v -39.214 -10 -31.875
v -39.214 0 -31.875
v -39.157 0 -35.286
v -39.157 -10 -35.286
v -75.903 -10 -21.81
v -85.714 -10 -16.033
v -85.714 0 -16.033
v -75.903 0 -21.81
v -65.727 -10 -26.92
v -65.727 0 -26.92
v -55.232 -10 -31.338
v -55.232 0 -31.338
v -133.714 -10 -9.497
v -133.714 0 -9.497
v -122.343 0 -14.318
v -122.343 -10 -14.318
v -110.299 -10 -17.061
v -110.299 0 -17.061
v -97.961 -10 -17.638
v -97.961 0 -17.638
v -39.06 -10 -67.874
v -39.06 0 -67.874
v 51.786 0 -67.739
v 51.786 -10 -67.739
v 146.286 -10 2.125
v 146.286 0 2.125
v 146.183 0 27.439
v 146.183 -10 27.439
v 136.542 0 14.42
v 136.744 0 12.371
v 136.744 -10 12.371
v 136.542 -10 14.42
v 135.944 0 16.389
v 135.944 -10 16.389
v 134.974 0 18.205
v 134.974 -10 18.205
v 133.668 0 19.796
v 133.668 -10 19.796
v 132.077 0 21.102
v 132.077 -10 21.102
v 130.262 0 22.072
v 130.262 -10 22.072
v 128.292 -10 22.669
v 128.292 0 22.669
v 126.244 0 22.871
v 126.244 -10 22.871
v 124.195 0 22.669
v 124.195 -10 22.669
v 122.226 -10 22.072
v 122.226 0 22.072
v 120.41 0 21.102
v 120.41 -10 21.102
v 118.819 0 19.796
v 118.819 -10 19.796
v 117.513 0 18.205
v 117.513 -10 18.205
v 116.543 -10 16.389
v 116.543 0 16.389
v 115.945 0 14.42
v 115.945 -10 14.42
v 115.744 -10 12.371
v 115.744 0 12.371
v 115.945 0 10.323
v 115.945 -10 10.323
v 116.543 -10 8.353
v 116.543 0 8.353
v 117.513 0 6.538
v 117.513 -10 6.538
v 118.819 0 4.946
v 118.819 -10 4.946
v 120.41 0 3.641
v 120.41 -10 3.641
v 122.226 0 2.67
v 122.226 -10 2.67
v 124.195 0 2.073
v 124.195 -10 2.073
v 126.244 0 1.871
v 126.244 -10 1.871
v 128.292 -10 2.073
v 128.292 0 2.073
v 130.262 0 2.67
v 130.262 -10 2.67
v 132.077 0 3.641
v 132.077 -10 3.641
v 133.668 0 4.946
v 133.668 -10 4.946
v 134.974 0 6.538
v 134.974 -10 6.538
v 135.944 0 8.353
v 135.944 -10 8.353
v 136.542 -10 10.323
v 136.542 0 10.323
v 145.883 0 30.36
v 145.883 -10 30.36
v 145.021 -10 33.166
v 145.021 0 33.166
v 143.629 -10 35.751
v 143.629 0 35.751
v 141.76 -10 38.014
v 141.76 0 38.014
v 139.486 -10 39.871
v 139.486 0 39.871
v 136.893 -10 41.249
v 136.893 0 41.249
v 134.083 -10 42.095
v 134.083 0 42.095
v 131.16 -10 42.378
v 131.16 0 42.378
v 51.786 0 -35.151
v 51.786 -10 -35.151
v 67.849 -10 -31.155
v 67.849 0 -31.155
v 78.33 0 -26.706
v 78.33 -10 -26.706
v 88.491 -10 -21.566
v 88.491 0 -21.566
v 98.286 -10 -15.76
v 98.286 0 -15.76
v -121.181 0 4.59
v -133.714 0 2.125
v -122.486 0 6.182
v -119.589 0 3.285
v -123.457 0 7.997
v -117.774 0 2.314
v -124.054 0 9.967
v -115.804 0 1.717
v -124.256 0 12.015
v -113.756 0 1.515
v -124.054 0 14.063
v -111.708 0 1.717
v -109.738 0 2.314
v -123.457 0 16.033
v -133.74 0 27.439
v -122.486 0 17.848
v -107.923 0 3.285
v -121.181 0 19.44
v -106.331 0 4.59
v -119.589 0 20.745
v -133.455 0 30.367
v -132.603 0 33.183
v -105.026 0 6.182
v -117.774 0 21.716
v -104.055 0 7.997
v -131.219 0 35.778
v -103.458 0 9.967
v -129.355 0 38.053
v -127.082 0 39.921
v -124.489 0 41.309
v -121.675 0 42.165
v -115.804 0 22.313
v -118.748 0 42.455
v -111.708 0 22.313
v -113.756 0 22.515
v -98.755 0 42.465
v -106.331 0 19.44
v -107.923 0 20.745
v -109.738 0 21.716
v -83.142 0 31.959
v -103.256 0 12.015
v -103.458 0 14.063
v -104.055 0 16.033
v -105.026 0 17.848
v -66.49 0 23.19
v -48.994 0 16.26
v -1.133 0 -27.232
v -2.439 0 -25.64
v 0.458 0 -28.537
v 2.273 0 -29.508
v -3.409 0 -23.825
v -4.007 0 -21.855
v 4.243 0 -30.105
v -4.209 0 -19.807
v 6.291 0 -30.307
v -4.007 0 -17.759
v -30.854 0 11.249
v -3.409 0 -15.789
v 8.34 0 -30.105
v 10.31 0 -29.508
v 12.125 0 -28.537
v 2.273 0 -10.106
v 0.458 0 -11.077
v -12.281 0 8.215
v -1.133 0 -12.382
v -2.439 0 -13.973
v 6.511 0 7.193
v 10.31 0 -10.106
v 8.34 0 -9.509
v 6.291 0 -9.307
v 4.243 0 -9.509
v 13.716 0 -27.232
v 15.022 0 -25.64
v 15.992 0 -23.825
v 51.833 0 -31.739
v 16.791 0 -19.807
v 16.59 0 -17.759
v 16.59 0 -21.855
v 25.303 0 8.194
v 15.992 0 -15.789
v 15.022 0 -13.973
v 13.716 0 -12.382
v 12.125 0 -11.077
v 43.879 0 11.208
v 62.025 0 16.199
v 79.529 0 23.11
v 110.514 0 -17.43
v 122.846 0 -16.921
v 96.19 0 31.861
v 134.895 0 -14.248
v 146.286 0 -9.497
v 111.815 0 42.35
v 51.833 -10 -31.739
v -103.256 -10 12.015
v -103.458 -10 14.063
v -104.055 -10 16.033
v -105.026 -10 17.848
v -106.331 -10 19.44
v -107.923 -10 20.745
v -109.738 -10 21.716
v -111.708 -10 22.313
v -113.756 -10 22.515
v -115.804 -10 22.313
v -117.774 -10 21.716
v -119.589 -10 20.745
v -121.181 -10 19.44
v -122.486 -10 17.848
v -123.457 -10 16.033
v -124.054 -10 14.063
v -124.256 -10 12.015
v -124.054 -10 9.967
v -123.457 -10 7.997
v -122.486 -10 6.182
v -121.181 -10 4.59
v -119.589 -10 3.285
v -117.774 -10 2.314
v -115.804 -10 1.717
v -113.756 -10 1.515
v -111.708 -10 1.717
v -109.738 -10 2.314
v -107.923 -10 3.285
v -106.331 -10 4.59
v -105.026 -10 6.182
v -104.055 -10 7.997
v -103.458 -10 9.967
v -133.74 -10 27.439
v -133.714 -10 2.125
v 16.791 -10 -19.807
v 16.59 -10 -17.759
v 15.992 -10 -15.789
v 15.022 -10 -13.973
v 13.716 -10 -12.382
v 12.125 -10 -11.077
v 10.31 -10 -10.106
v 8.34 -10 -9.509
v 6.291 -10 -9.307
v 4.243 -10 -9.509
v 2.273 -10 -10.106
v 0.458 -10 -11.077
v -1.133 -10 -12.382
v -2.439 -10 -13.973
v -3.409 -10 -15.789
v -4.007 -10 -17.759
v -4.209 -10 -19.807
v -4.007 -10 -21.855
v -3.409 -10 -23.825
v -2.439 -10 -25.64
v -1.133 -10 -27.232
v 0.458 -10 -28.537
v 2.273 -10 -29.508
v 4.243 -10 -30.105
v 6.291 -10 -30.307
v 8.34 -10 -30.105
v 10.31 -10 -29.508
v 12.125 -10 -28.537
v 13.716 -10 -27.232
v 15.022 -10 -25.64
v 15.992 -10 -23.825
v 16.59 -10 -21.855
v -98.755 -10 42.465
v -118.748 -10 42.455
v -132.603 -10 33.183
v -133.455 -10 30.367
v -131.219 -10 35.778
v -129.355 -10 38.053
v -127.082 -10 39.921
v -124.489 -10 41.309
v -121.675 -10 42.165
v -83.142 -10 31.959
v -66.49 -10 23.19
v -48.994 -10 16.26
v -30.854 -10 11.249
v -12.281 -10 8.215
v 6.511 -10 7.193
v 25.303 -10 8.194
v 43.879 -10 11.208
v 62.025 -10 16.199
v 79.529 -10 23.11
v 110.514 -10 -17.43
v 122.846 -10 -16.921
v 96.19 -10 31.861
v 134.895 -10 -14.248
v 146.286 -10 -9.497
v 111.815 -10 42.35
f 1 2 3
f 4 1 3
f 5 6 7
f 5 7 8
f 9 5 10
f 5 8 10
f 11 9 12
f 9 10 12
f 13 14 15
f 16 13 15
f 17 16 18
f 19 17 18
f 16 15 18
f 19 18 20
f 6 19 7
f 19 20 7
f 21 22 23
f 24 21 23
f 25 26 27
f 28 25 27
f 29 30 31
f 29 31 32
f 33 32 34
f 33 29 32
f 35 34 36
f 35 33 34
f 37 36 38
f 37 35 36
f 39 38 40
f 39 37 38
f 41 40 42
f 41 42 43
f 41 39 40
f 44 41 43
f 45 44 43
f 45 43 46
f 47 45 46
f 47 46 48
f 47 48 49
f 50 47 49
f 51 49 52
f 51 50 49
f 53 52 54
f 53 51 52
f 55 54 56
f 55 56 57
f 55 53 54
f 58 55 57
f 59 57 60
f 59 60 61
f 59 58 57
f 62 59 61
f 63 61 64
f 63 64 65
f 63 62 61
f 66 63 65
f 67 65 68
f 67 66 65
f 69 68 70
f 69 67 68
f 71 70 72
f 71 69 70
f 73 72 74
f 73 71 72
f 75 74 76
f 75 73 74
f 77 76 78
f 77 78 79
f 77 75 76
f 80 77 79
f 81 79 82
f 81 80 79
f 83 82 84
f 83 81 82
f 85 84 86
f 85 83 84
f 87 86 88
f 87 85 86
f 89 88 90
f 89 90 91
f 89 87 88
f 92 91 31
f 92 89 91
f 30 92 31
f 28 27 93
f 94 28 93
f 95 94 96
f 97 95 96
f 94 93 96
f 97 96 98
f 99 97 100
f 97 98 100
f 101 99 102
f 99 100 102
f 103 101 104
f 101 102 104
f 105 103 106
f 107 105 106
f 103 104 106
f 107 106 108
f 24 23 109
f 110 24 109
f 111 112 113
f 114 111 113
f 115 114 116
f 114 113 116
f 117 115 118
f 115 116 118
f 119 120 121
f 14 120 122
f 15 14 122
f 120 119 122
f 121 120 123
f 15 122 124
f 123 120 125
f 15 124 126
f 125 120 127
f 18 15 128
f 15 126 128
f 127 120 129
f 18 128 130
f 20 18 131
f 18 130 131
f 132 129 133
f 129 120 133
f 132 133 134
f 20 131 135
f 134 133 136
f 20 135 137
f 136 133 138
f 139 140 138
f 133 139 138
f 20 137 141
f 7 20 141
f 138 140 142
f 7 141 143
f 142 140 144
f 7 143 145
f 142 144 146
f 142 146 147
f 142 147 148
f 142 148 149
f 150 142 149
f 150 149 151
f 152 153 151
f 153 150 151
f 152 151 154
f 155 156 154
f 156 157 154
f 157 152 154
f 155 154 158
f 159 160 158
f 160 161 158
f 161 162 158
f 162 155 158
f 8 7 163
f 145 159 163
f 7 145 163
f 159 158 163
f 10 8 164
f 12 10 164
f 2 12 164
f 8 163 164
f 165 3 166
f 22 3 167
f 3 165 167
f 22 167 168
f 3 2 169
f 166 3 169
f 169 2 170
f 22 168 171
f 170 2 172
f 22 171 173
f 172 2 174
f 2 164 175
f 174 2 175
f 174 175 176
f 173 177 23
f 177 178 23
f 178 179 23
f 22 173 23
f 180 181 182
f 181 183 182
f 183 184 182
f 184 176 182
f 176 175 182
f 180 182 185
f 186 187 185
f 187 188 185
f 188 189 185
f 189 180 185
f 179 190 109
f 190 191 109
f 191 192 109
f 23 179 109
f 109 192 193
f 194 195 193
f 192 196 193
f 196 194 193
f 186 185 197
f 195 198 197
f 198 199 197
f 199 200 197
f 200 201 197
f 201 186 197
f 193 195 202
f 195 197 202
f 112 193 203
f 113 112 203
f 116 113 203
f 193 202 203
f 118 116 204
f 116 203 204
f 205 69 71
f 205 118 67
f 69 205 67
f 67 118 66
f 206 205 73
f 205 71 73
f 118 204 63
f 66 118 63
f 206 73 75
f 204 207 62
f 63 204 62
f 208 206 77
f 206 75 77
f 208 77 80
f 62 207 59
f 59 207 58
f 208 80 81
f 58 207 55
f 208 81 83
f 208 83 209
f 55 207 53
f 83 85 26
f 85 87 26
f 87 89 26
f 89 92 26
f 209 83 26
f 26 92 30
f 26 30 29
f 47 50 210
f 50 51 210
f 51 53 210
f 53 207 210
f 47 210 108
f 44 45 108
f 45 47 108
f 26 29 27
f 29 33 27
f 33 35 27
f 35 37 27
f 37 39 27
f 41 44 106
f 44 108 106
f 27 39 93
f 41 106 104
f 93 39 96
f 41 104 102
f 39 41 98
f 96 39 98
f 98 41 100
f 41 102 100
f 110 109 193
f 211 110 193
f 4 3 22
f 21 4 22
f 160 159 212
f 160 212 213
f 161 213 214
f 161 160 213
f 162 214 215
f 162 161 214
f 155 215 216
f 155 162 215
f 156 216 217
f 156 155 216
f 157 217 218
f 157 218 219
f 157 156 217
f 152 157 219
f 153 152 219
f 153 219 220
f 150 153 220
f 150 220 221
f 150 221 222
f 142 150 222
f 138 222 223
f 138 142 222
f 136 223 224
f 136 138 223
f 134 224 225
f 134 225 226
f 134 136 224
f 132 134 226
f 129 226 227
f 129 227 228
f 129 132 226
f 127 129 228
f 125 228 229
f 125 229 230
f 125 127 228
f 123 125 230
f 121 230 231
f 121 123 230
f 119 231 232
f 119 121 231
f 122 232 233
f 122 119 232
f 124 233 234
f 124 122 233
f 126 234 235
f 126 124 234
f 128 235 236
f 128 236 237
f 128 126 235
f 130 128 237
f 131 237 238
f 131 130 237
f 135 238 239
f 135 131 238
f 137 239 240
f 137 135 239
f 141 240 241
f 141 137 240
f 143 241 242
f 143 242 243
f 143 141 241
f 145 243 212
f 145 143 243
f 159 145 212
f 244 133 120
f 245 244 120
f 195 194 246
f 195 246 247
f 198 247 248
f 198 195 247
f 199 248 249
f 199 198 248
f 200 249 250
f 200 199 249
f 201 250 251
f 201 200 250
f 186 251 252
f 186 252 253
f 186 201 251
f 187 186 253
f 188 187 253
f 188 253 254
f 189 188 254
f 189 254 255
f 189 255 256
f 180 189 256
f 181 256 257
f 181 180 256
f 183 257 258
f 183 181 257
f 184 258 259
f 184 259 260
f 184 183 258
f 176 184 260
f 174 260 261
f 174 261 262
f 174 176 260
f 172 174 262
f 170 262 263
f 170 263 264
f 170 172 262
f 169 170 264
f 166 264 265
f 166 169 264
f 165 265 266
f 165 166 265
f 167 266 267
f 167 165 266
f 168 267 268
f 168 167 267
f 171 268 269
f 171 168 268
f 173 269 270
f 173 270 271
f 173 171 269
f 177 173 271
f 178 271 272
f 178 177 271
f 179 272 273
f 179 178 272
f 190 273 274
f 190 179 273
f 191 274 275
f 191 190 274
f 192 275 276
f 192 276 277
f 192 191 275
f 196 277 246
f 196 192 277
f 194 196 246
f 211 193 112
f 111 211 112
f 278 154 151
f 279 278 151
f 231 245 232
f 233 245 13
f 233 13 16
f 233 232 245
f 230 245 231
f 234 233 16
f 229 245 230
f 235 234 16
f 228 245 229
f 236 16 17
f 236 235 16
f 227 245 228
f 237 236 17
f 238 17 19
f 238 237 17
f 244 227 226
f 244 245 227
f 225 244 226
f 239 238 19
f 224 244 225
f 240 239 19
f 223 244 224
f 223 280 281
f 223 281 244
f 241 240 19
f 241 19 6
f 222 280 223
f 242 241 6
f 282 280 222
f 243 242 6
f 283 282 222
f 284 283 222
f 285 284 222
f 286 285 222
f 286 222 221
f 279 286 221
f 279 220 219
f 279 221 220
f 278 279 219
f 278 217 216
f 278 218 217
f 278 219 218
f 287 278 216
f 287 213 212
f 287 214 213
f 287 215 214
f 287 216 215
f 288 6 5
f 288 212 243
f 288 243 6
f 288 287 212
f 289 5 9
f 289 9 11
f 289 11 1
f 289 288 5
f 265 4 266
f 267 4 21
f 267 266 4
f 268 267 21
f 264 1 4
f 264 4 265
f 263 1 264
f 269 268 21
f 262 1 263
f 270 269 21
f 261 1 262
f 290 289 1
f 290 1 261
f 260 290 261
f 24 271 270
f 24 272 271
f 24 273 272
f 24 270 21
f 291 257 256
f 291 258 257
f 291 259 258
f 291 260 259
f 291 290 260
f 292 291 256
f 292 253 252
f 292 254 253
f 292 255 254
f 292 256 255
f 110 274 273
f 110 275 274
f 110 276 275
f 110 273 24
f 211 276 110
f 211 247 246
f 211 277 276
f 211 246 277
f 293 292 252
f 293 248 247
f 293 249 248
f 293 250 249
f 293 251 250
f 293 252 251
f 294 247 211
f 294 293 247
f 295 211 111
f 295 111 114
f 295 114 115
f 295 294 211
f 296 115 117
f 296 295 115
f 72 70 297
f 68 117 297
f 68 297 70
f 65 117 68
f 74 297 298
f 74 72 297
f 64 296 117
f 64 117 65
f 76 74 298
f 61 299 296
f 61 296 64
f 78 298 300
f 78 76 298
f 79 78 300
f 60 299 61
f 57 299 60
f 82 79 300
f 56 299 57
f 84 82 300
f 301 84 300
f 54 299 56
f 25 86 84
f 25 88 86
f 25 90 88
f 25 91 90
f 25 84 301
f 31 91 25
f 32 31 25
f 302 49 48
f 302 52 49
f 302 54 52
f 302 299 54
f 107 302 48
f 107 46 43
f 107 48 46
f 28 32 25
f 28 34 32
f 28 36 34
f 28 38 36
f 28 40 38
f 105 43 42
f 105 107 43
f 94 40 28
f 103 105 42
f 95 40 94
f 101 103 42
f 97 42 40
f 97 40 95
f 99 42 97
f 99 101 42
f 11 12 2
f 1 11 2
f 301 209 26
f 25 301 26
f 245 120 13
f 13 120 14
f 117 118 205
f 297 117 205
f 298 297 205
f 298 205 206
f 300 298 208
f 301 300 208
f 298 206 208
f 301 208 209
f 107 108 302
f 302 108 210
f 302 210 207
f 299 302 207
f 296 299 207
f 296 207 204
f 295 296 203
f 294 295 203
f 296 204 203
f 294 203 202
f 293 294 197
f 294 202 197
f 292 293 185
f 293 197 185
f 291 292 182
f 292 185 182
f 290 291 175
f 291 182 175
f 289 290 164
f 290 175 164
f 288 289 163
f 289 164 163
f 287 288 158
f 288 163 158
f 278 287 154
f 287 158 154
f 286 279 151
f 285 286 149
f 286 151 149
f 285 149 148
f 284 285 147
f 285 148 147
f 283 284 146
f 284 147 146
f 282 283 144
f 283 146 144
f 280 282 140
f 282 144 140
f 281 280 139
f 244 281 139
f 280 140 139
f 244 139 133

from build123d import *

# Parameters (mm, degrees)
F0_R     = 10.5
F1_DEPTH = 10


# Not quite as in the source:
# - ends of sketch curves that miss each other by under 0.0002 mm in the source are joined


with BuildPart() as f1:
    # F0 (on Front) → F1 (new body)
    with BuildSketch(Plane.XZ):
        with BuildLine():
            Line((-98.7553787733, 42.4647671212), (-118.7477670626, 42.4546280338))
            ThreePointArc((-118.7477670626, 42.4546280338), (-129.3548271656, 38.0531599477), (-133.7401521369, 27.4394155453))
            Line((-133.7401521369, 27.4394155453), (-133.71447629, 2.1254326641))
            Line((-133.71447629, 2.1254326641), (-133.71447629, -9.4965361613))
            ThreePointArc((-133.71447629, -9.4965361613), (-110.2994737436, -17.0606664942), (-85.71447629, -16.0328960194))
            ThreePointArc((-85.71447629, -16.0328960194), (-70.8573251513, -24.4500205619), (-55.2321770125, -31.3375216442))
            Line((-55.2321770125, -31.3375216442), (-39.21447629, -31.8745673359))
            Line((-39.21447629, -31.8745673359), (-39.1571401322, -35.2863552357))
            Line((-39.1571401322, -35.2863552357), (-39.0604409149, -67.8742687524))
            Line((-39.0604409149, -67.8742687524), (51.78552371, -67.7394838983))
            Line((51.78552371, -67.7394838983), (51.78552371, -35.1514269125))
            Line((51.78552371, -35.1514269125), (51.8327357464, -31.7394838983))
            Line((51.8327357464, -31.7394838983), (67.8487723641, -31.1549109155))
            ThreePointArc((67.8487723641, -31.1549109155), (83.4534142883, -24.2210753293), (98.28552371, -15.7599019106))
            ThreePointArc((98.28552371, -15.7599019106), (122.8456433746, -16.920758379), (146.28552371, -9.4965361613))
            Line((146.28552371, -9.4965361613), (146.28552371, 2.1254326641))
            Line((146.28552371, 2.1254326641), (146.1826080128, 27.4394155453))
            ThreePointArc((146.1826080128, 27.4394155453), (141.7598617434, 38.0144245463), (131.1604712744, 42.378416024))
            Line((131.1604712744, 42.378416024), (111.8151785594, 42.3497066713))
            ThreePointArc((111.8151785594, 42.3497066713), (6.5106579482, 7.1928164678), (-98.7553787733, 42.4647671212))
        make_face()
        with Locations((6.2913256733, -19.8069641195)):
            Circle(F0_R, mode=Mode.SUBTRACT)
        with Locations((-113.7560071881, 12.015007423)):
            Circle(F0_R, mode=Mode.SUBTRACT)
        with Locations((126.2437040296, 12.371086267)):
            Circle(F0_R, mode=Mode.SUBTRACT)
    extrude(amount=F1_DEPTH)


solid = f1.part
